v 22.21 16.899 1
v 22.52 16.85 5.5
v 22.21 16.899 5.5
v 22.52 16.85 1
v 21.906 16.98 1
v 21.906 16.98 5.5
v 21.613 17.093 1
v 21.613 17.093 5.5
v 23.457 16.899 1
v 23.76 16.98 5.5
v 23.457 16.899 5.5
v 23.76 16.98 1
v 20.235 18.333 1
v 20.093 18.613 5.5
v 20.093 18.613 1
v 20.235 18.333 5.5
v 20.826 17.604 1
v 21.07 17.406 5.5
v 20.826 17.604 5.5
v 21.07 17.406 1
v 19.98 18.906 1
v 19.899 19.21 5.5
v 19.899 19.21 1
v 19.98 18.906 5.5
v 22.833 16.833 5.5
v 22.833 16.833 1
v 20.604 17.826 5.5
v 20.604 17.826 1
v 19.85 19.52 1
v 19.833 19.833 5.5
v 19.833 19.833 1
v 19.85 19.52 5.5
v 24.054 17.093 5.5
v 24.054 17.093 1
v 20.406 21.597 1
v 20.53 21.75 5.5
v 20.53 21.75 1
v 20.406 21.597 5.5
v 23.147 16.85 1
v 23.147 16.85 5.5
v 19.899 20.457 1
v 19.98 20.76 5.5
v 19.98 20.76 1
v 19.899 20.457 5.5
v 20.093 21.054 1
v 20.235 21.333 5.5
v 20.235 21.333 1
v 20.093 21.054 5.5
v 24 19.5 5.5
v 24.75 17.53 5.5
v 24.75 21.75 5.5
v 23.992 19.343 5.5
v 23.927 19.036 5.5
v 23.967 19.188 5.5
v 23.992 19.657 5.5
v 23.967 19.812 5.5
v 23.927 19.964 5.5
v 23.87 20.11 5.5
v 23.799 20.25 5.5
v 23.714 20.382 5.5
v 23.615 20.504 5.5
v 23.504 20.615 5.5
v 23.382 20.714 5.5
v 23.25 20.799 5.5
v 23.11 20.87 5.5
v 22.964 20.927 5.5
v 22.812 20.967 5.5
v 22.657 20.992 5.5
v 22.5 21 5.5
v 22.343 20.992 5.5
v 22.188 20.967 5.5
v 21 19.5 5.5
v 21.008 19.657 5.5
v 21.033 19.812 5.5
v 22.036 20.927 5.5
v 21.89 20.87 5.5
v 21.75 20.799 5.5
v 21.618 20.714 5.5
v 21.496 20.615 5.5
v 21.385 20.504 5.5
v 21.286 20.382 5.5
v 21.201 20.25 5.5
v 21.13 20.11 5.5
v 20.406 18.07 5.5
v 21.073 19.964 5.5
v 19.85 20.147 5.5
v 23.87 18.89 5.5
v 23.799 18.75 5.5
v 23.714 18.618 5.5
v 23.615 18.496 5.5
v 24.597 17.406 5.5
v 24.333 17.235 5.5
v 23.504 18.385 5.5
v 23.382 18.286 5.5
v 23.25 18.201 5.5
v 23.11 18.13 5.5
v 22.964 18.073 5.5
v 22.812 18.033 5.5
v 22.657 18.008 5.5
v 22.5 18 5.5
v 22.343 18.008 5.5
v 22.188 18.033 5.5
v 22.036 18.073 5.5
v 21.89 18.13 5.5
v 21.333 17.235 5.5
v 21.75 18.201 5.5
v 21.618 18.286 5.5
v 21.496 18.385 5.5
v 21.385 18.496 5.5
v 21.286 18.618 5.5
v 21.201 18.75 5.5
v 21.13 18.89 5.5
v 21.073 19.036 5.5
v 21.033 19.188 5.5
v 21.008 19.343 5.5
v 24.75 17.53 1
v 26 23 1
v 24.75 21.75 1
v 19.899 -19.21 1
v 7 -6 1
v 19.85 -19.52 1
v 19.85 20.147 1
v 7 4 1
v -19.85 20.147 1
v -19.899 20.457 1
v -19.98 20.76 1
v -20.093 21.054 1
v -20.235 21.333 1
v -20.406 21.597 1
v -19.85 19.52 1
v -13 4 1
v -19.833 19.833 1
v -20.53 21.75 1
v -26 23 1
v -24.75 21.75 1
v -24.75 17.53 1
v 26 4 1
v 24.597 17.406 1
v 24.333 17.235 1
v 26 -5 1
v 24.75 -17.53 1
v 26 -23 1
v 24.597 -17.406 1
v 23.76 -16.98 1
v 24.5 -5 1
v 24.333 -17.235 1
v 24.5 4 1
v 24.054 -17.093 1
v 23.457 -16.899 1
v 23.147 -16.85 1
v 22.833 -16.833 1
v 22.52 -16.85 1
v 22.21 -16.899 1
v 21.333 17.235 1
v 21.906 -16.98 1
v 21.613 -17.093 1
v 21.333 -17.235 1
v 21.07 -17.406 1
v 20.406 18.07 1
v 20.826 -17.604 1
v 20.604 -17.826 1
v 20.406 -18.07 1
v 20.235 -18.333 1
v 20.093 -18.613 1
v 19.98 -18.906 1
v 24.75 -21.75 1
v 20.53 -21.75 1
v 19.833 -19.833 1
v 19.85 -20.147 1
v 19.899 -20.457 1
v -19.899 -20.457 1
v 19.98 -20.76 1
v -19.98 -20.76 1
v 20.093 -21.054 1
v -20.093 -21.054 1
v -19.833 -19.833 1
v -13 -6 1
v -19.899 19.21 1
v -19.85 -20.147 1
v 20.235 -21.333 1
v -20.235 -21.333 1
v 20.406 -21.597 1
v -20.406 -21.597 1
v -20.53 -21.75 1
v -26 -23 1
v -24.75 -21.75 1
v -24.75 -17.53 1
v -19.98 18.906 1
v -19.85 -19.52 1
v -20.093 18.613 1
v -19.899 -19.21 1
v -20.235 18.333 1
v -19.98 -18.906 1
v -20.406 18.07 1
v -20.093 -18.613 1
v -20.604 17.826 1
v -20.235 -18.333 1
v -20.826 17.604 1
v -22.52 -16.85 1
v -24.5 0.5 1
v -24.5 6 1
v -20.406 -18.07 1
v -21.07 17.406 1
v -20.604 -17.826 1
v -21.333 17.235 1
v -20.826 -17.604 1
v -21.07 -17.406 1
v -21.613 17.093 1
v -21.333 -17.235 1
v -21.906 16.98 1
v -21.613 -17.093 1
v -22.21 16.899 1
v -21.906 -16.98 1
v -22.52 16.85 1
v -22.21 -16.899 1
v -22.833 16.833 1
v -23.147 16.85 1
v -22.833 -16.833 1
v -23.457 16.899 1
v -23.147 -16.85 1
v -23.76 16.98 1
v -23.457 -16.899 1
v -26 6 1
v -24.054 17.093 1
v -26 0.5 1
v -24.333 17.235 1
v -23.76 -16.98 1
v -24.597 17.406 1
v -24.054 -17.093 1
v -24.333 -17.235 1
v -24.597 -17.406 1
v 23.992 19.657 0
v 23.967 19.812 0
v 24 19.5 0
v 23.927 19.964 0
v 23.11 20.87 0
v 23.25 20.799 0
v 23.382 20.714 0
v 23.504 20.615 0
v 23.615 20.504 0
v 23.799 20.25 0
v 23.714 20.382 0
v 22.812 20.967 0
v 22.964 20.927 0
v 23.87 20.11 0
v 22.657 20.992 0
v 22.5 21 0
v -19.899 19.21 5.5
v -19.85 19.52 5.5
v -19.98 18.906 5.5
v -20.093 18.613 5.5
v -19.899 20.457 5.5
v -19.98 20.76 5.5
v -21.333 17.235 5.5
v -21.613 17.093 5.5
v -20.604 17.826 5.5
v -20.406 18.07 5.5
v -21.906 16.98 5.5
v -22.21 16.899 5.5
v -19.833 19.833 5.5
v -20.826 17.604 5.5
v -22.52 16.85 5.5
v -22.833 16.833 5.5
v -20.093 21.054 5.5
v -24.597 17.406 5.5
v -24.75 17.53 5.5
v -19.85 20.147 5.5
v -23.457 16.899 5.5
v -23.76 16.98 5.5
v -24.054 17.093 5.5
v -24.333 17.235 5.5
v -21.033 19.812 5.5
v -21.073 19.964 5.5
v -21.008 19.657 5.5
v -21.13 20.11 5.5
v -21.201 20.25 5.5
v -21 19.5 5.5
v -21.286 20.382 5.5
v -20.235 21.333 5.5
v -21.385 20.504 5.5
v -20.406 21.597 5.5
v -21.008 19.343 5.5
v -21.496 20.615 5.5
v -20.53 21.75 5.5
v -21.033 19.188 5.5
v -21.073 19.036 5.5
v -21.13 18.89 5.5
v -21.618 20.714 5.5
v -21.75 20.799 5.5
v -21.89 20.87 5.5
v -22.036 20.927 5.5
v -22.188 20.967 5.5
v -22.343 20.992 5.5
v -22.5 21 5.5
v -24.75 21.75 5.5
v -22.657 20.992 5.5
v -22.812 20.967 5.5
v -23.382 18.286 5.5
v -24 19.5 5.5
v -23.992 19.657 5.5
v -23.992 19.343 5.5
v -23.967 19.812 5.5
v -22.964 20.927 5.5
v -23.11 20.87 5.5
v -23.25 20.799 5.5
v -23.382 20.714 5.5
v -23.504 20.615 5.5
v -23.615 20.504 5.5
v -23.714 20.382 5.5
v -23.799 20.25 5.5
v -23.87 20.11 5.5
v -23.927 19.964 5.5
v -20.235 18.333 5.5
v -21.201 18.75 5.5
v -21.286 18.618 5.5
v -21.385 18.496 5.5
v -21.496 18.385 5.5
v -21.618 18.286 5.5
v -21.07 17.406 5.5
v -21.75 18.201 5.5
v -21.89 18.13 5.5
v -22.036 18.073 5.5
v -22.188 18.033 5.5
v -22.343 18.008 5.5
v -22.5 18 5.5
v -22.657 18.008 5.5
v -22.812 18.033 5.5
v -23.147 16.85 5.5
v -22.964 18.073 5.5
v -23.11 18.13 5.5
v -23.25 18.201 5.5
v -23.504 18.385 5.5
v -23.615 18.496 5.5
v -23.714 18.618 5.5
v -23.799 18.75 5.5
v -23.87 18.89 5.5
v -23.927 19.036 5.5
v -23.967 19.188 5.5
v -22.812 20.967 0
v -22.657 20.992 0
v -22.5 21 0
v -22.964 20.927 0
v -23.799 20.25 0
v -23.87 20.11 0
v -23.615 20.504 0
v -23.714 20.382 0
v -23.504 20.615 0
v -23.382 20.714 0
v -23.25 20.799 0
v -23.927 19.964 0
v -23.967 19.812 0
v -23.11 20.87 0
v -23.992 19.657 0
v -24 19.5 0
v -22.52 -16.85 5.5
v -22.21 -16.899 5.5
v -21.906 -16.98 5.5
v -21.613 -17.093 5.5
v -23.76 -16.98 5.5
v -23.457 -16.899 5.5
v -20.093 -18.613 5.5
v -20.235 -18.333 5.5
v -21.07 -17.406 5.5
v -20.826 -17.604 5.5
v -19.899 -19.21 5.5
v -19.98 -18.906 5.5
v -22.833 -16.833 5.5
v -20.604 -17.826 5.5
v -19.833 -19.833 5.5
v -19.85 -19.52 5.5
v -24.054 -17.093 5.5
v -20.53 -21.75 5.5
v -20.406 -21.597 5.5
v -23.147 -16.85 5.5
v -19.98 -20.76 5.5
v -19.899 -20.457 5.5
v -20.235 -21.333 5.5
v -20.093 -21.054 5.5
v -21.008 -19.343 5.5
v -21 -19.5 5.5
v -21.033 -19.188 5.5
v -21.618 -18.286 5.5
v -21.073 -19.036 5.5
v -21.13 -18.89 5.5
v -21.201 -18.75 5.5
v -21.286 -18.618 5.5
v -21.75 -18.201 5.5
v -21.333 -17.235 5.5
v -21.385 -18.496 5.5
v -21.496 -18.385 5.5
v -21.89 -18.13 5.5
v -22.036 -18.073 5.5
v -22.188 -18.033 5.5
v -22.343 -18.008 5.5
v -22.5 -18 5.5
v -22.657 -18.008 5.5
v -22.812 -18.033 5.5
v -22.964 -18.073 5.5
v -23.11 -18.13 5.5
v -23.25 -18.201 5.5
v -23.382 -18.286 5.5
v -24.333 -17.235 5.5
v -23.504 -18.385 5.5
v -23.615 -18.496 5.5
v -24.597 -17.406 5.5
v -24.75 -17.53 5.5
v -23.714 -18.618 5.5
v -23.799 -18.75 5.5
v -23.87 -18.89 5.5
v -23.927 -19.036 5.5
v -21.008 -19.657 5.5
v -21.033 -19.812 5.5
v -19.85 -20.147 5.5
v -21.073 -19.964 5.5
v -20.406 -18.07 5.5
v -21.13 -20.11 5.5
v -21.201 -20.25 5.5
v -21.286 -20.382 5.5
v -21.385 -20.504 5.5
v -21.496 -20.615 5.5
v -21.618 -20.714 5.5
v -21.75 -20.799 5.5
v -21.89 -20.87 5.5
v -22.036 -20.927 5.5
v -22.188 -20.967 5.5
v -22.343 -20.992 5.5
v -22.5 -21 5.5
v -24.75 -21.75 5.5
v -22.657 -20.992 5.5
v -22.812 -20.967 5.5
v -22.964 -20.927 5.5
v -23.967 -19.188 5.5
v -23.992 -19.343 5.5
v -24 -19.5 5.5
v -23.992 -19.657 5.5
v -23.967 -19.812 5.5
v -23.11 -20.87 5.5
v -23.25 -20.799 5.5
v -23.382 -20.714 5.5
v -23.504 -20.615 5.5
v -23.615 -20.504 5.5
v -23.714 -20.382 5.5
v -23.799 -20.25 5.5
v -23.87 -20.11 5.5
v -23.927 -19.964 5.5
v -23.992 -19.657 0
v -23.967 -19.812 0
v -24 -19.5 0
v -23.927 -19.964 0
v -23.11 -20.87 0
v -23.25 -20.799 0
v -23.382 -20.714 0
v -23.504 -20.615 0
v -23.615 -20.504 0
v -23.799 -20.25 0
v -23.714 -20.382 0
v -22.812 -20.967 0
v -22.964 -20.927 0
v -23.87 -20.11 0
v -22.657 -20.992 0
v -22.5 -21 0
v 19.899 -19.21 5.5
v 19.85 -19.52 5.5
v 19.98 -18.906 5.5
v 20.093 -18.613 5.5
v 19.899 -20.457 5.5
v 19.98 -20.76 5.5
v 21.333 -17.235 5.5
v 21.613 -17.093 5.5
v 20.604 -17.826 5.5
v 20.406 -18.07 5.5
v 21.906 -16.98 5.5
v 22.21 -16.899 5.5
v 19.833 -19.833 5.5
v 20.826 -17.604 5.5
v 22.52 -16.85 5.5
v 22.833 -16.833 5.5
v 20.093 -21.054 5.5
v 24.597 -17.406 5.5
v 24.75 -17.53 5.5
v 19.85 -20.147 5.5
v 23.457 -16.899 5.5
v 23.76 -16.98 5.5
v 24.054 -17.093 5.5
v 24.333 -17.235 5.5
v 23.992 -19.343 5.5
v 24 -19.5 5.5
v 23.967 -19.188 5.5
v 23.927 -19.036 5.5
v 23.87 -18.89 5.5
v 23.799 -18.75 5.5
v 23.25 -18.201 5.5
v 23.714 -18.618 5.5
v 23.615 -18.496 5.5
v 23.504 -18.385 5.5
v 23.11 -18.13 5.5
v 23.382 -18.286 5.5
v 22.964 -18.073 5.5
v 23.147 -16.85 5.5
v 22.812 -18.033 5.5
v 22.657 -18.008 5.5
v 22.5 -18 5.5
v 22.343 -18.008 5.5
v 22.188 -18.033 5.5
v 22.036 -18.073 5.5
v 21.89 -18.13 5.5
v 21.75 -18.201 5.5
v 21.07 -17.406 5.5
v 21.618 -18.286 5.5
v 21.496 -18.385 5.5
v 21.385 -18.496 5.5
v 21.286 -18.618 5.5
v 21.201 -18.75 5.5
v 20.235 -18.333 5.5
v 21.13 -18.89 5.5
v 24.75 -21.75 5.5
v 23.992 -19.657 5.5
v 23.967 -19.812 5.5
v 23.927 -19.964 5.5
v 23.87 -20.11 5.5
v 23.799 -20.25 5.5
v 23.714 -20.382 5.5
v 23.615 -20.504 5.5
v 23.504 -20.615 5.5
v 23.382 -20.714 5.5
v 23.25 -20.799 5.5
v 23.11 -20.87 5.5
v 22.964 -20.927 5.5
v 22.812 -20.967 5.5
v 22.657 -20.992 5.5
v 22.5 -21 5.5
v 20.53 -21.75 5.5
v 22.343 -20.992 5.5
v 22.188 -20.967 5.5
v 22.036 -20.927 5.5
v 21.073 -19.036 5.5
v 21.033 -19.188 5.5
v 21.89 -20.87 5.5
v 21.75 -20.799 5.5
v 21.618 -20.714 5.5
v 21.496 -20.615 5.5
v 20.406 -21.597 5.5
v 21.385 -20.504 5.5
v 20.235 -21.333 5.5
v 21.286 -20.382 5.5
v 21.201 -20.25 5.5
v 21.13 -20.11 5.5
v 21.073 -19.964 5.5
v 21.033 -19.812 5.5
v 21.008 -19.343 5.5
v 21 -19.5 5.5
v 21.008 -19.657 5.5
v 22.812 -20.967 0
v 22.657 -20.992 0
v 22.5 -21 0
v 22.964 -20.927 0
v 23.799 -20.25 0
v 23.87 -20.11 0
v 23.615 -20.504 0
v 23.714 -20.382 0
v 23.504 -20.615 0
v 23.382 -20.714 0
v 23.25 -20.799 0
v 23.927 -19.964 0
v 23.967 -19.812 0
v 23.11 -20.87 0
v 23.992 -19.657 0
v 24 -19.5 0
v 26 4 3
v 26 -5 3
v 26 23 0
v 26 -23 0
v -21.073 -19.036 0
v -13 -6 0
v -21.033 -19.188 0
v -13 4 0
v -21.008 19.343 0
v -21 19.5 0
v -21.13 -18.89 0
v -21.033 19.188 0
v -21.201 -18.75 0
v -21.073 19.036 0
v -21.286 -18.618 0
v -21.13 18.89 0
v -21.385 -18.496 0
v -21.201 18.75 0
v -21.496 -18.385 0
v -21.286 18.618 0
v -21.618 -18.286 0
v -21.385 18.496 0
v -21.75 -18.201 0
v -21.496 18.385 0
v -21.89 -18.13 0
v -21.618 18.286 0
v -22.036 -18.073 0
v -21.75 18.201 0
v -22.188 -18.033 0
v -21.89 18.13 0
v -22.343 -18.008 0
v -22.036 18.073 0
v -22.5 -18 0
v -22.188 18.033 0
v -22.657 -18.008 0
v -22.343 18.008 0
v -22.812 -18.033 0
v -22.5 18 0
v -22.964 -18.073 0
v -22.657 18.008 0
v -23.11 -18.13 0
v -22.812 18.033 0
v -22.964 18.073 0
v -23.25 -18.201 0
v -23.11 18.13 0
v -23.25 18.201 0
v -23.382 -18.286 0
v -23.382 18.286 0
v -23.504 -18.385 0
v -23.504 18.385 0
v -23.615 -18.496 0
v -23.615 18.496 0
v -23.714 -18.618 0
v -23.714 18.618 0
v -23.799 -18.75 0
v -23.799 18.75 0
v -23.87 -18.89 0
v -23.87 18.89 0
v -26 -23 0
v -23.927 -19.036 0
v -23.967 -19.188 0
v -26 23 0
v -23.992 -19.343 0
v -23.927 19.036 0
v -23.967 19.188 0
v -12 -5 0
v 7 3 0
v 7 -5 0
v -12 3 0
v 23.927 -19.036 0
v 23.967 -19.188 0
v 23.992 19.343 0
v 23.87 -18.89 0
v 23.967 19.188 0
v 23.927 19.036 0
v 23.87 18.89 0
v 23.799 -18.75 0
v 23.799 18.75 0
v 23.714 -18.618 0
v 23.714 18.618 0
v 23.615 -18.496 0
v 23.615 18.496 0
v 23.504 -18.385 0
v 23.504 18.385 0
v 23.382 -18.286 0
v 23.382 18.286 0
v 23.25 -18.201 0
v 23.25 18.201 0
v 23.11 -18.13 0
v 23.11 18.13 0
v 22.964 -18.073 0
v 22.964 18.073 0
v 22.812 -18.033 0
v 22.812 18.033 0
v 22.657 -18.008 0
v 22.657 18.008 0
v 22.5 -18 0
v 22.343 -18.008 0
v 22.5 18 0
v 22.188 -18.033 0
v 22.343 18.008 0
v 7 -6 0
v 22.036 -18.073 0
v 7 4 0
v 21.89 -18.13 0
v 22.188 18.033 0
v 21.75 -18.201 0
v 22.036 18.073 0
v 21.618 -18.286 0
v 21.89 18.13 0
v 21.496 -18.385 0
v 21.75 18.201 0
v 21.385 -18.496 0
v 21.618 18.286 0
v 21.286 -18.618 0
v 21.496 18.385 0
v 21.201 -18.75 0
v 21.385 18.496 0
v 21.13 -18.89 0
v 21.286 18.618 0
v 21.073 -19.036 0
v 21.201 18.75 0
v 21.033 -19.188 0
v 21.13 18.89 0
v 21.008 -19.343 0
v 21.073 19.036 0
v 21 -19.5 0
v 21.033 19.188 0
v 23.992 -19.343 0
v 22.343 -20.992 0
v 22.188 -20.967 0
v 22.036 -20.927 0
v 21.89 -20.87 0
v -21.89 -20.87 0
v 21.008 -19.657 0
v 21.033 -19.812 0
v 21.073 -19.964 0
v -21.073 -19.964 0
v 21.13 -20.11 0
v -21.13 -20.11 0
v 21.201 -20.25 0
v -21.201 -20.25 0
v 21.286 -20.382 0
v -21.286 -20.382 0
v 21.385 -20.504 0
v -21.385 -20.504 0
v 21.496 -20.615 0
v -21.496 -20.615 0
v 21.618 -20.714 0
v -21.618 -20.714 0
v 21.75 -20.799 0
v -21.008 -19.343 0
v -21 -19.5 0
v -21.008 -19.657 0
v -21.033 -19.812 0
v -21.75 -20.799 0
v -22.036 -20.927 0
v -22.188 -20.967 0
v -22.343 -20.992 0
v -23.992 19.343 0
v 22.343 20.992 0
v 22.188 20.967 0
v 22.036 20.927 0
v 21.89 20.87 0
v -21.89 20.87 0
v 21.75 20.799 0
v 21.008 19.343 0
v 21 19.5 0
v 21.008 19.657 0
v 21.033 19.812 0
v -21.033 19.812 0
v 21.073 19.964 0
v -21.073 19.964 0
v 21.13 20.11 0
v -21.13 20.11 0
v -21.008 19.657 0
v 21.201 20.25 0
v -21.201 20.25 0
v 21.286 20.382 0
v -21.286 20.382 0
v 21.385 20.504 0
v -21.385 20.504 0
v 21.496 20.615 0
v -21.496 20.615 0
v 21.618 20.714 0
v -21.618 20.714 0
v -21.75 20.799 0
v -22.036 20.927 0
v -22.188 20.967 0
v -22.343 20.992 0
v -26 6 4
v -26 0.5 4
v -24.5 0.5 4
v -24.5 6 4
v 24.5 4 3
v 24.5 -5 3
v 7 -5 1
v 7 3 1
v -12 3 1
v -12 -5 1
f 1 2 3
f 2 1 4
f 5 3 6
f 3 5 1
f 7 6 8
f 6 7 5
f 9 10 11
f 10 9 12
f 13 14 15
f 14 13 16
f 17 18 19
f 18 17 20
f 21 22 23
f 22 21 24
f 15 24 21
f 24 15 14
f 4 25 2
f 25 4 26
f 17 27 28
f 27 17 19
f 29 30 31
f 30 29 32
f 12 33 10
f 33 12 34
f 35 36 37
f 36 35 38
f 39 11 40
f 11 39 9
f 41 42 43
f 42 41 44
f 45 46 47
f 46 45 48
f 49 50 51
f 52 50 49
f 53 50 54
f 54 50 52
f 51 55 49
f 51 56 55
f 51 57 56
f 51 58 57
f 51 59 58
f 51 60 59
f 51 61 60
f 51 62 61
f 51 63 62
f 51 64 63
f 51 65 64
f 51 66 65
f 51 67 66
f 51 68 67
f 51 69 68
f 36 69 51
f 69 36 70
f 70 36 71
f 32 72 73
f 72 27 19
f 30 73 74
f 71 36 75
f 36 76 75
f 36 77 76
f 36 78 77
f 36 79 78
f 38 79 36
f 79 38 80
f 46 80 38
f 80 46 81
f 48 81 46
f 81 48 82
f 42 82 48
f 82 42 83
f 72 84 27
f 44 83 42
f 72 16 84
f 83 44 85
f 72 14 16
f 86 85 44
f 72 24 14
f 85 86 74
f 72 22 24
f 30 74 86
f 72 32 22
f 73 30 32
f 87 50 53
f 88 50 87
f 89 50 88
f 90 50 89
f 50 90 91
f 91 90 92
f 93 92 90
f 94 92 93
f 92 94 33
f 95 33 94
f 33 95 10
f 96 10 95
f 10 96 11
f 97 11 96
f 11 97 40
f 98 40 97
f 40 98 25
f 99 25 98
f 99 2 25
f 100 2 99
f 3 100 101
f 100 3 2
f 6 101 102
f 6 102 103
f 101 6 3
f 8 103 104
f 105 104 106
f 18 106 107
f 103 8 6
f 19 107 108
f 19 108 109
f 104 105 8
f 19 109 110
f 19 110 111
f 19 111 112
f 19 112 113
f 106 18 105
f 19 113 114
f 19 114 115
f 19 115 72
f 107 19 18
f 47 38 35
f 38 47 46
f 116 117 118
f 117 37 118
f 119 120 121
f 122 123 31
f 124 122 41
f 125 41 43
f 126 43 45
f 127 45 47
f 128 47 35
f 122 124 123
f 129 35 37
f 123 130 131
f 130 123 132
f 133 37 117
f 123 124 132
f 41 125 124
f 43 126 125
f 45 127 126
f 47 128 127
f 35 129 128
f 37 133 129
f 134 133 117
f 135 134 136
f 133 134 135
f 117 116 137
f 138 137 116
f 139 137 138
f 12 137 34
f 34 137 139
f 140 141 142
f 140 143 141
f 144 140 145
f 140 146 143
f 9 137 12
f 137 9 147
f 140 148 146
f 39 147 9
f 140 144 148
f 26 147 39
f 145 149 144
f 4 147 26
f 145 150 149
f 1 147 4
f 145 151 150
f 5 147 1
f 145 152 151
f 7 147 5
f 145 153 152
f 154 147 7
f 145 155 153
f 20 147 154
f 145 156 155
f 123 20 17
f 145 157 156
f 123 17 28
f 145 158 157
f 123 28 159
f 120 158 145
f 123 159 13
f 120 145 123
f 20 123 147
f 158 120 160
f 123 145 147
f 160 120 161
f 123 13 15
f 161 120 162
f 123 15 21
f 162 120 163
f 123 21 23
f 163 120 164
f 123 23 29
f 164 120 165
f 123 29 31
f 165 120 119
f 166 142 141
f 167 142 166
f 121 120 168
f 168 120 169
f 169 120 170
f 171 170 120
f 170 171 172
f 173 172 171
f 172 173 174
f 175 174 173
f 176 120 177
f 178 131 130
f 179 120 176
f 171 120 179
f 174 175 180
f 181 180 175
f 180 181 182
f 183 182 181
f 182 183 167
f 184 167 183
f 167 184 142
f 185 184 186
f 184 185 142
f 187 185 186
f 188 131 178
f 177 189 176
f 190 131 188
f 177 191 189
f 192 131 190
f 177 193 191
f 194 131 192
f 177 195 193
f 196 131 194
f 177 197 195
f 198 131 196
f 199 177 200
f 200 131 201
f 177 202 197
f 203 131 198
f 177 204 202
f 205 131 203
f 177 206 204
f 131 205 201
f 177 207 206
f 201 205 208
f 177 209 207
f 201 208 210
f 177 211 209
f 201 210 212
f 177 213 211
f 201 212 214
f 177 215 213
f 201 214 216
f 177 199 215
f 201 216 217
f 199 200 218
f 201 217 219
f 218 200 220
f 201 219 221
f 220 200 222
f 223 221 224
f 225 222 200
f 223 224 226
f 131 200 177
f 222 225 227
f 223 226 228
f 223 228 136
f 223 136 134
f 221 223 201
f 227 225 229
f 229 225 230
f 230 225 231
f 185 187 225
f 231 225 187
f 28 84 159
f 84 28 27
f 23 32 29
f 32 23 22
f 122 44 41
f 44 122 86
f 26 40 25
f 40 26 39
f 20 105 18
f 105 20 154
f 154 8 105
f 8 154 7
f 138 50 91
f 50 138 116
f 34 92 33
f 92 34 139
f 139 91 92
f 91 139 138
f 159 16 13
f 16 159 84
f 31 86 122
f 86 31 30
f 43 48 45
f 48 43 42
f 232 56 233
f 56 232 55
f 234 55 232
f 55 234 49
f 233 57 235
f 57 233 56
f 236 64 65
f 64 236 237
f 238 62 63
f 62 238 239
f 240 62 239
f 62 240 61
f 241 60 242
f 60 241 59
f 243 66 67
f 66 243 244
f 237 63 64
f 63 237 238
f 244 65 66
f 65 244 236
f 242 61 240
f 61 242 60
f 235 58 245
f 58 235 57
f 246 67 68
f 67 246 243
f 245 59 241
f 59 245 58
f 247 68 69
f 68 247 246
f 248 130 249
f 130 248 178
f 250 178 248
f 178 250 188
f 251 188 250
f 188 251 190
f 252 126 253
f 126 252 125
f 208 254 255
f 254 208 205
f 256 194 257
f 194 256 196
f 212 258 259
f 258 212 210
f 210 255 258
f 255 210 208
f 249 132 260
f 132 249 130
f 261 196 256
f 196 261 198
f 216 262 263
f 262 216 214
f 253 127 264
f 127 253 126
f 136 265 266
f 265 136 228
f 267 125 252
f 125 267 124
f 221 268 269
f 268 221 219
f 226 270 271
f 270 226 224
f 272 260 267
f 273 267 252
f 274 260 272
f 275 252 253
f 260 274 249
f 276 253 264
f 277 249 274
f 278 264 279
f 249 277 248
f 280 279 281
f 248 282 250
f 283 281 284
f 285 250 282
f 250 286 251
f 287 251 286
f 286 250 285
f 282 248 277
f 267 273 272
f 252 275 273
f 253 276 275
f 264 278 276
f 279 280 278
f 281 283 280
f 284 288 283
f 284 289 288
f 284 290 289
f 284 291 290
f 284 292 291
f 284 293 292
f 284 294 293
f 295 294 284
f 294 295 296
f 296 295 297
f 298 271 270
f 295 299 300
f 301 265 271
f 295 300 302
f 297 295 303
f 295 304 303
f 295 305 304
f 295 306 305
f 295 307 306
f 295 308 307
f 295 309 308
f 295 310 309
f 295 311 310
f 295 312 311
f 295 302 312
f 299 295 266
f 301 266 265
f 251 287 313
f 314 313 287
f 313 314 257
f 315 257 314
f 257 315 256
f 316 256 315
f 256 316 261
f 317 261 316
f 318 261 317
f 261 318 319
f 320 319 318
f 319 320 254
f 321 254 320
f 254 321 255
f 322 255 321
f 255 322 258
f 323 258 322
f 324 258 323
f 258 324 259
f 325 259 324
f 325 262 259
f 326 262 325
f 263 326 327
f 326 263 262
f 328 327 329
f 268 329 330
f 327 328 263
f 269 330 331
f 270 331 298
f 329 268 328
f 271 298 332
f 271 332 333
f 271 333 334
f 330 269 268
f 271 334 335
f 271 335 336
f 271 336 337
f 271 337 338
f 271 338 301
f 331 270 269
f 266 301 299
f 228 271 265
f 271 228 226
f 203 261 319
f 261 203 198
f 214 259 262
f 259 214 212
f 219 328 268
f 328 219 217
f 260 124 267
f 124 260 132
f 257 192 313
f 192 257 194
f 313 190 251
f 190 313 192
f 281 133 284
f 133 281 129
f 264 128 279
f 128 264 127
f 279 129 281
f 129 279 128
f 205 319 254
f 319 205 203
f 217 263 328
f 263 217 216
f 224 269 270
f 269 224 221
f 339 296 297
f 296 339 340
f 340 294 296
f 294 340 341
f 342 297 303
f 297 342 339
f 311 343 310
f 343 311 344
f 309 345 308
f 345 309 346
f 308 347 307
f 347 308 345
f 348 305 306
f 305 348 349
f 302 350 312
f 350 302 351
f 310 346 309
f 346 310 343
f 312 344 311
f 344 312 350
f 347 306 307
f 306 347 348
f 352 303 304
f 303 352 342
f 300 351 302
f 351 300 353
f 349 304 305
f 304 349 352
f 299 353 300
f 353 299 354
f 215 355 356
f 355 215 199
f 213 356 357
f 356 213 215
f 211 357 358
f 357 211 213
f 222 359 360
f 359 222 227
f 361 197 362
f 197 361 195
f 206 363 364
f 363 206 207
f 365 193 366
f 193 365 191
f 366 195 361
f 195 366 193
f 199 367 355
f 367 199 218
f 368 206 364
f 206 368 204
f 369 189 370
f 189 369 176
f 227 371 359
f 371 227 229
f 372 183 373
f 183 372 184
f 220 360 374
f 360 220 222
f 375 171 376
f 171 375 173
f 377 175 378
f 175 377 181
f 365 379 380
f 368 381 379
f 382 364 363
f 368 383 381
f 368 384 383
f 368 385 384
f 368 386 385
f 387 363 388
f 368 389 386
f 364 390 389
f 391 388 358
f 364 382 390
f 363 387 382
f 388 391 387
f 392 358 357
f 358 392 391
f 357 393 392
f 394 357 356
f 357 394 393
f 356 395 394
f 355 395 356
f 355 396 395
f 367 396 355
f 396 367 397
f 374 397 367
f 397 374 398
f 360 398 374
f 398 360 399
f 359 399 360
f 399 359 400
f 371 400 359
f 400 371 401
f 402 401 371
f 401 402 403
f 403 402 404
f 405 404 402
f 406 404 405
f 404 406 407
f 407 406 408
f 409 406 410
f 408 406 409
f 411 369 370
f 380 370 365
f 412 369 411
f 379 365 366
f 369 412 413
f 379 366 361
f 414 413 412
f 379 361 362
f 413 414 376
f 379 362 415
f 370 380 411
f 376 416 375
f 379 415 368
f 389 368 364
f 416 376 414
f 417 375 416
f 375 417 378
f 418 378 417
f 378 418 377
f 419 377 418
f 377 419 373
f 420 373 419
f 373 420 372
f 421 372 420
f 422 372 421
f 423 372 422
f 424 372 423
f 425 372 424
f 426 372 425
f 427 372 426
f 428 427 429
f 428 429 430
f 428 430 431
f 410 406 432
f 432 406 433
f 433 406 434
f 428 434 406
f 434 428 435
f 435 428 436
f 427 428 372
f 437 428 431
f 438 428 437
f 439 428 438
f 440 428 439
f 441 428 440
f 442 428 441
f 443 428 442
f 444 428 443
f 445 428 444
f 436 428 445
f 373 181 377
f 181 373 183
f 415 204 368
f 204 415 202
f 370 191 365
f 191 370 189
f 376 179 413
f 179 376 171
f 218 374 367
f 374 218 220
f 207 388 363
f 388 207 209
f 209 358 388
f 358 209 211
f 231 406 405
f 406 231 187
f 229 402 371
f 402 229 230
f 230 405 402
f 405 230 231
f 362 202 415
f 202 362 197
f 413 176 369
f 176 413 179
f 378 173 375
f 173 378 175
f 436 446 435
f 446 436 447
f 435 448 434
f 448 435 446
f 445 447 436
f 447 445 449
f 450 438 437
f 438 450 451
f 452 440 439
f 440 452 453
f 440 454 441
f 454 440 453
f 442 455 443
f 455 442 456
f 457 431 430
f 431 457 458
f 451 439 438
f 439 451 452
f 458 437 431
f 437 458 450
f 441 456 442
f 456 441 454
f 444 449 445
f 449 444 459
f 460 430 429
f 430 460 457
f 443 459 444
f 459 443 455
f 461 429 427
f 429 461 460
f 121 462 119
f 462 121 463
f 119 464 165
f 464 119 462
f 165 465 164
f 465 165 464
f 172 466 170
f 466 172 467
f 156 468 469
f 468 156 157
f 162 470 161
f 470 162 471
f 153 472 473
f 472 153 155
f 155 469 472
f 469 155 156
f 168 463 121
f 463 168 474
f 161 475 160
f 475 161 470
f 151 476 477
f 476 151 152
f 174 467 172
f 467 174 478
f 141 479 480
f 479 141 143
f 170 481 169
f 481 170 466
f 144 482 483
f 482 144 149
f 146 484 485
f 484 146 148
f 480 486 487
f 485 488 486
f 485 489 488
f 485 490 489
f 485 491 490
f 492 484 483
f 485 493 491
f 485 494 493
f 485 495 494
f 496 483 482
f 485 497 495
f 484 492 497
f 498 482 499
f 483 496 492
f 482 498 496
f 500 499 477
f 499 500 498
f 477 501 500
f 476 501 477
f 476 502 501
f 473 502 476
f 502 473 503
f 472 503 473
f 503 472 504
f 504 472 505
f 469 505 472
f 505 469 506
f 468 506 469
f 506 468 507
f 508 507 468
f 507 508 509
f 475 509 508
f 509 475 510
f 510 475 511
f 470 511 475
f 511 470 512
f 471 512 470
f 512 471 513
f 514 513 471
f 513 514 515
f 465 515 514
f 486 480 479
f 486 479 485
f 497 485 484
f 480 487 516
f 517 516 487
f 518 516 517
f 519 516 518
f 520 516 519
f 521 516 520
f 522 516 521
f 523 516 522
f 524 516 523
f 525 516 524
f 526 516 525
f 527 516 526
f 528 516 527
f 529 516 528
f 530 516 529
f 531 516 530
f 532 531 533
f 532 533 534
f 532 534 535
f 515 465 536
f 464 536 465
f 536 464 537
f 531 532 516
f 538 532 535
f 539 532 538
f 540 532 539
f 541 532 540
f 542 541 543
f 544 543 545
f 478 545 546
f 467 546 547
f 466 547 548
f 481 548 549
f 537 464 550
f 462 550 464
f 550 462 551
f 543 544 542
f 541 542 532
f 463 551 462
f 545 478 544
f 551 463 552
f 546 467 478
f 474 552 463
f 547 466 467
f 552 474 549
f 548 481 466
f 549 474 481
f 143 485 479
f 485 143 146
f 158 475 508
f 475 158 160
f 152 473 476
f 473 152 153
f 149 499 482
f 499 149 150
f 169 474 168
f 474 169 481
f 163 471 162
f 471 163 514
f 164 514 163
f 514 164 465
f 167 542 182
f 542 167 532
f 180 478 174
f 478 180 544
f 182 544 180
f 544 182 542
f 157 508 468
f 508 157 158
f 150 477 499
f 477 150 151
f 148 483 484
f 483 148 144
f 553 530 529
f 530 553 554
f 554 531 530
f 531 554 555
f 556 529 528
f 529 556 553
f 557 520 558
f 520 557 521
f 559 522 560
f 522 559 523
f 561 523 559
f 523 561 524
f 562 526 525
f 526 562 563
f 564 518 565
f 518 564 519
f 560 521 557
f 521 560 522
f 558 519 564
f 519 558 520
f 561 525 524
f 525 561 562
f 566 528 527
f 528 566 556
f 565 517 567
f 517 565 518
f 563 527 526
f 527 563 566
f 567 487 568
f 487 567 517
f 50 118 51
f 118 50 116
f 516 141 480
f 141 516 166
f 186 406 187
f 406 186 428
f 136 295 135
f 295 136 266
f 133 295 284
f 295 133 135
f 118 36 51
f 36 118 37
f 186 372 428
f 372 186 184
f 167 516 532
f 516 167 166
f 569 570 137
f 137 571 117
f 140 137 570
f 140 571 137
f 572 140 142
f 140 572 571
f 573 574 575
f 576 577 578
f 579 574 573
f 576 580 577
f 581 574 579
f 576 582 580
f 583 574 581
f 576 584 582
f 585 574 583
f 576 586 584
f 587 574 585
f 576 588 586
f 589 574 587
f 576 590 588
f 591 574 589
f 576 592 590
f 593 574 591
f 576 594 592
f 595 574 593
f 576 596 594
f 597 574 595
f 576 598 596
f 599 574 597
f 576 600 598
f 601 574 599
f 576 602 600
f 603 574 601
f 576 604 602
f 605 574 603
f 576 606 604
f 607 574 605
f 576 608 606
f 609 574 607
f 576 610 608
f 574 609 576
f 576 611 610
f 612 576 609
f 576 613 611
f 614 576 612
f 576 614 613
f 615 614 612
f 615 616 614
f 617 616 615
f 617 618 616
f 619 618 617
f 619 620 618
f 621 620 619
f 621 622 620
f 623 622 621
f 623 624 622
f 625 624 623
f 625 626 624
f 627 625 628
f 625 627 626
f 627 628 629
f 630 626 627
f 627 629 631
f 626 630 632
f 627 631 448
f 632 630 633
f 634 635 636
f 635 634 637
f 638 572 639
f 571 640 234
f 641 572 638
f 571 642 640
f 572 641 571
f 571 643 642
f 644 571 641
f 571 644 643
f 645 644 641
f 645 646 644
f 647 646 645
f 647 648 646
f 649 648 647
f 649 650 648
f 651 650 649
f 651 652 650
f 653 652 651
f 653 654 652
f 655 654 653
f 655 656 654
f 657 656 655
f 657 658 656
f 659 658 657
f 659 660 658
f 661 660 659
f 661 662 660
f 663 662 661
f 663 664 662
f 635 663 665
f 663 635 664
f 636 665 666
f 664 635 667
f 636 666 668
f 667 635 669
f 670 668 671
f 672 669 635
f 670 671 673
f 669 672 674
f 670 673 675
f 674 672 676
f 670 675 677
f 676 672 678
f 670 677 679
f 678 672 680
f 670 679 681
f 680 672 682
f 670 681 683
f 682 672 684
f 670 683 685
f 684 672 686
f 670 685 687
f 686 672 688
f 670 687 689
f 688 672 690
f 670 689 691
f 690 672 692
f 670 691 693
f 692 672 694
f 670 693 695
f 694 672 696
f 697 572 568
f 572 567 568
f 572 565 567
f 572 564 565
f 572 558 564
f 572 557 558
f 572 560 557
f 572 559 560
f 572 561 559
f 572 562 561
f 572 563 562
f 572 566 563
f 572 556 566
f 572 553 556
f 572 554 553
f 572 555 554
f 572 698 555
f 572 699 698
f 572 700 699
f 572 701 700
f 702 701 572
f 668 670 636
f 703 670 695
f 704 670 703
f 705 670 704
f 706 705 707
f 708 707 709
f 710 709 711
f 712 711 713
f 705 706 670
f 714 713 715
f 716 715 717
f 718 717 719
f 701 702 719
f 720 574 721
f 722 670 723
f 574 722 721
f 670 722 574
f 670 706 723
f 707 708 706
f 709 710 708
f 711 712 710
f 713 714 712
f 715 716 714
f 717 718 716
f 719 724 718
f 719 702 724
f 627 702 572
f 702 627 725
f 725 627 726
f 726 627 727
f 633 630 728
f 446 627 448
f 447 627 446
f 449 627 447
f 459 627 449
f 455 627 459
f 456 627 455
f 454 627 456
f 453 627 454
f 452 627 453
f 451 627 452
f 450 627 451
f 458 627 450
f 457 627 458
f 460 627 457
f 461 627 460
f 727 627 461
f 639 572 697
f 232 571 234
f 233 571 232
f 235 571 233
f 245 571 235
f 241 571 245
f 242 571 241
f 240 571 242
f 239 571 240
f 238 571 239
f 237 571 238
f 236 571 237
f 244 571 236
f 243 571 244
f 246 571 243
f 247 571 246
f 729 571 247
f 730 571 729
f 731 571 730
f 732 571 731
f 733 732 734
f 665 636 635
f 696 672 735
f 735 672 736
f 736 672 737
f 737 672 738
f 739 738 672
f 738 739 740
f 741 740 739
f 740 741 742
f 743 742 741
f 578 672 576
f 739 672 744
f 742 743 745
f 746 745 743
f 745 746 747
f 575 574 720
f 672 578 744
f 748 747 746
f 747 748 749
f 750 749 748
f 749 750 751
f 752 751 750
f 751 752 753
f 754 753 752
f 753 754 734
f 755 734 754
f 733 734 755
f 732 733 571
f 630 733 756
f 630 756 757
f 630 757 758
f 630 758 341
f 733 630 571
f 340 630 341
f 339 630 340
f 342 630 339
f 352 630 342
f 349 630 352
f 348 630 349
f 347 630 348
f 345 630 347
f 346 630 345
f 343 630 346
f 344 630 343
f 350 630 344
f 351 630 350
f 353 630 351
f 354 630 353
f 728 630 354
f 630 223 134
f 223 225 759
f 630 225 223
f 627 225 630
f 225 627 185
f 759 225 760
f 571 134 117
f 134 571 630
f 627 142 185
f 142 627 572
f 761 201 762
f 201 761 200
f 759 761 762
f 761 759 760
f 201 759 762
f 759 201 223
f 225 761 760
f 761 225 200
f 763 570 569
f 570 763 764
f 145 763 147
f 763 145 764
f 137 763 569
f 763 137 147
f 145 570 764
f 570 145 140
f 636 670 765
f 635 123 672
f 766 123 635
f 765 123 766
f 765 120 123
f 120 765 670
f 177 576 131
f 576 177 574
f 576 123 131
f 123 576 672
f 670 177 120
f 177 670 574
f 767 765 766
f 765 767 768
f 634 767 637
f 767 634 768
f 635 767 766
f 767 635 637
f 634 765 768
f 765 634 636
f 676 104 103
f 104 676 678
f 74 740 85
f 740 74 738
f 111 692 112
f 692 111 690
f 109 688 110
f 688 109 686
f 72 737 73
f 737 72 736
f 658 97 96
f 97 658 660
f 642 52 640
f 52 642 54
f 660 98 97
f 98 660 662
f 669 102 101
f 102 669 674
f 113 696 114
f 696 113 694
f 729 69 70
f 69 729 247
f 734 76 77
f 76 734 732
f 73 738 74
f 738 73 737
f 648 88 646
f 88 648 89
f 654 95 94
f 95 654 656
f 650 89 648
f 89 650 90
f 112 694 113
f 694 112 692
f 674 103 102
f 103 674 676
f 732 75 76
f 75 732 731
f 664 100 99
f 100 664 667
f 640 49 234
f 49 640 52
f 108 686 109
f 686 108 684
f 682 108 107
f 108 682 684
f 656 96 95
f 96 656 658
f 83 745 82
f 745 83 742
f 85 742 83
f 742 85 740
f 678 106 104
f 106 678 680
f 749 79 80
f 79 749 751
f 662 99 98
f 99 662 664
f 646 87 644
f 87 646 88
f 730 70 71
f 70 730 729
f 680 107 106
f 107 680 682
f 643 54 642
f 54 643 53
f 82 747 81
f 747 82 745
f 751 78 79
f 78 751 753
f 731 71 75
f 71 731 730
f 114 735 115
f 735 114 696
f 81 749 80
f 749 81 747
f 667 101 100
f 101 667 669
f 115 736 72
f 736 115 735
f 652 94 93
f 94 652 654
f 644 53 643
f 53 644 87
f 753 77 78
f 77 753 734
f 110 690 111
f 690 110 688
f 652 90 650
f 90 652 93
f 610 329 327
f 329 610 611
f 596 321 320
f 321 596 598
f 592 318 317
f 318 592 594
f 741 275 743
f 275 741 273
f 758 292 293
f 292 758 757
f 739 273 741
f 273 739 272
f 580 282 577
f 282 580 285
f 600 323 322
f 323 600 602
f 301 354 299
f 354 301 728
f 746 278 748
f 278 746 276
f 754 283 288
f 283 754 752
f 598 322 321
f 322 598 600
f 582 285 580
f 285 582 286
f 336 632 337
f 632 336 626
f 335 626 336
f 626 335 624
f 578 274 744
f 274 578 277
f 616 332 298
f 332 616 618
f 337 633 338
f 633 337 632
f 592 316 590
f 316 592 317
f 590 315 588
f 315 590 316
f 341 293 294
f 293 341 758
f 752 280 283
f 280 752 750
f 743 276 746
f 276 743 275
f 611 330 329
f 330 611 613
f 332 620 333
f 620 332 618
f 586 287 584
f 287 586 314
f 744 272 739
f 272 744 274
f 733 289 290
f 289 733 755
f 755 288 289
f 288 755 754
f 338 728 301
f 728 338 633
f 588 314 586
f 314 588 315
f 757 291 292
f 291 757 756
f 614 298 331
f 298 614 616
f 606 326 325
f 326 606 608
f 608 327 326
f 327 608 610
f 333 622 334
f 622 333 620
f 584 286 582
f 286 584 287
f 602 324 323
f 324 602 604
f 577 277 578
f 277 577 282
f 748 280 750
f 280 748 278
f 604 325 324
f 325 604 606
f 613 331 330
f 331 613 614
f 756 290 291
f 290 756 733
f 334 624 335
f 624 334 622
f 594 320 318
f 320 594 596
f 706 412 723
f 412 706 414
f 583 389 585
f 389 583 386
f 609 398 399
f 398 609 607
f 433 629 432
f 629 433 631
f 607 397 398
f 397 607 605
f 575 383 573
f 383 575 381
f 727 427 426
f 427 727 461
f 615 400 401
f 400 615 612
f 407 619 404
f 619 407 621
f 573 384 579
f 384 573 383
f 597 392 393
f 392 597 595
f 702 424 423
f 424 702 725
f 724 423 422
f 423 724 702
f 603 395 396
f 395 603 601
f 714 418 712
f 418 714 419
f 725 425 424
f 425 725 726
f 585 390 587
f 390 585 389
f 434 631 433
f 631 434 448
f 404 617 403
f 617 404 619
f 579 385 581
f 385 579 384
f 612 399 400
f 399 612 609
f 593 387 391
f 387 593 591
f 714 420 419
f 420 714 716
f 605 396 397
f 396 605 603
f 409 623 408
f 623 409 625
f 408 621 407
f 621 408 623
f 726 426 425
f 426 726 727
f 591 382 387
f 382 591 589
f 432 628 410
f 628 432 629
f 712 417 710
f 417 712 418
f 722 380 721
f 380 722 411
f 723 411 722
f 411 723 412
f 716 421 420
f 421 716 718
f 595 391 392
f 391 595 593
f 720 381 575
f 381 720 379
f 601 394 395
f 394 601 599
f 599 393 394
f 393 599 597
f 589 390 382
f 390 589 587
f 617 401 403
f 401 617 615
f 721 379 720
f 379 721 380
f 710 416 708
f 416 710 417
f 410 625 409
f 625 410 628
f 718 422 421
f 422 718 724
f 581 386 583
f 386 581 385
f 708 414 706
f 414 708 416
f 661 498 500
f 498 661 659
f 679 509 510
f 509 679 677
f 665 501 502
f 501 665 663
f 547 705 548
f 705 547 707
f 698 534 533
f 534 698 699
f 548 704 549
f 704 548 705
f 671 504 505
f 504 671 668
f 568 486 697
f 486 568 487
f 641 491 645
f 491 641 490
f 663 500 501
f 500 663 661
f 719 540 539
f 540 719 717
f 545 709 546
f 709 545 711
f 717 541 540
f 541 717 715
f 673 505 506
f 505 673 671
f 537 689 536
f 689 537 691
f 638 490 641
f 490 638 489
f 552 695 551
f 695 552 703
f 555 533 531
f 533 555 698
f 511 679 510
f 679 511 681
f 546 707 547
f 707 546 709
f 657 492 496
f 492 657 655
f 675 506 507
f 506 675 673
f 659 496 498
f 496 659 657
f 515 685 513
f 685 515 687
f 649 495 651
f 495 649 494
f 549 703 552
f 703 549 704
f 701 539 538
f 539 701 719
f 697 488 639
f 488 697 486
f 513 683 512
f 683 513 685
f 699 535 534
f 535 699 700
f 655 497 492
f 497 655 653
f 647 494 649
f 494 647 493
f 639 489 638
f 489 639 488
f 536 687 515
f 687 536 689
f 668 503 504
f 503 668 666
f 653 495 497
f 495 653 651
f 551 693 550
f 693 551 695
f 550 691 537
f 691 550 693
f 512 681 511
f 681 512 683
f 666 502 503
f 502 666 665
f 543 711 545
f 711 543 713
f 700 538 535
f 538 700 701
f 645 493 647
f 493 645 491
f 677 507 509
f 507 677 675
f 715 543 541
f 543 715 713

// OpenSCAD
$fn=60;

t = 1;
x = 50;
y = 44;
z = 11;

do = 6;
di = 3;
lo = 4.5;
p = 2.5;

techn = 0.5;

module mainform() {
	translate([-(x-techn)/2, -(y-techn)/2, 0]) cube([x-techn,y-techn,z-techn]);	
}

module plate() {
	translate([-(x+2*t)/2, -(y+2*t)/2, 0]) cube([x+2*t,y+2*t,t]);	
}

module cyl(b=0) {
	if (b == 0) {
		difference() {
			translate([t/3,t/3,0]) cylinder(h=lo, r=(do)/2);
			translate([0,0,t]) cylinder(h=100+0.001, r=di/2, center = true);
		}
	} else {

			translate([0,0,t]) cylinder(h=100+0.001, r=di/2, center = true);
	}
}

module center_button() {
	difference() {
		cube([20,10,t + 0.001]);
		translate([t,t,-0.0005]) cube([20-t,10-2*t,t+0.001]);
	}
}

difference() {
	union() {
		plate();
		intersection() {
			union() {
				translate([x/2-p,y/2-p,t]) cyl();
				translate([-x/2+p,y/2-p,t]) rotate(90) cyl();
				translate([-x/2+p,-y/2+p,t]) rotate(180) cyl();
				translate([x/2-p,-y/2+p,t]) rotate(270) cyl();
			}
			mainform();
		}
		translate([-(x+2*t)/2,techn,t]) cube([t*1.5,6.5 - techn * 2,3]);
		translate([+(x+2*t)/2-t*1.5,-5,t]) cube([t*1.5,10 - techn * 2,2]);
	}
	translate([-25+12,22-10-18,-0.0005]) center_button();
	
			union() {
				translate([x/2-p,y/2-p,t]) cyl(1);
				translate([-x/2+p,y/2-p,t]) rotate(90) cyl(1);
				translate([-x/2+p,-y/2+p,t]) rotate(180) cyl(1);
				translate([x/2-p,-y/2+p,t]) rotate(270) cyl(1);
			}
}
